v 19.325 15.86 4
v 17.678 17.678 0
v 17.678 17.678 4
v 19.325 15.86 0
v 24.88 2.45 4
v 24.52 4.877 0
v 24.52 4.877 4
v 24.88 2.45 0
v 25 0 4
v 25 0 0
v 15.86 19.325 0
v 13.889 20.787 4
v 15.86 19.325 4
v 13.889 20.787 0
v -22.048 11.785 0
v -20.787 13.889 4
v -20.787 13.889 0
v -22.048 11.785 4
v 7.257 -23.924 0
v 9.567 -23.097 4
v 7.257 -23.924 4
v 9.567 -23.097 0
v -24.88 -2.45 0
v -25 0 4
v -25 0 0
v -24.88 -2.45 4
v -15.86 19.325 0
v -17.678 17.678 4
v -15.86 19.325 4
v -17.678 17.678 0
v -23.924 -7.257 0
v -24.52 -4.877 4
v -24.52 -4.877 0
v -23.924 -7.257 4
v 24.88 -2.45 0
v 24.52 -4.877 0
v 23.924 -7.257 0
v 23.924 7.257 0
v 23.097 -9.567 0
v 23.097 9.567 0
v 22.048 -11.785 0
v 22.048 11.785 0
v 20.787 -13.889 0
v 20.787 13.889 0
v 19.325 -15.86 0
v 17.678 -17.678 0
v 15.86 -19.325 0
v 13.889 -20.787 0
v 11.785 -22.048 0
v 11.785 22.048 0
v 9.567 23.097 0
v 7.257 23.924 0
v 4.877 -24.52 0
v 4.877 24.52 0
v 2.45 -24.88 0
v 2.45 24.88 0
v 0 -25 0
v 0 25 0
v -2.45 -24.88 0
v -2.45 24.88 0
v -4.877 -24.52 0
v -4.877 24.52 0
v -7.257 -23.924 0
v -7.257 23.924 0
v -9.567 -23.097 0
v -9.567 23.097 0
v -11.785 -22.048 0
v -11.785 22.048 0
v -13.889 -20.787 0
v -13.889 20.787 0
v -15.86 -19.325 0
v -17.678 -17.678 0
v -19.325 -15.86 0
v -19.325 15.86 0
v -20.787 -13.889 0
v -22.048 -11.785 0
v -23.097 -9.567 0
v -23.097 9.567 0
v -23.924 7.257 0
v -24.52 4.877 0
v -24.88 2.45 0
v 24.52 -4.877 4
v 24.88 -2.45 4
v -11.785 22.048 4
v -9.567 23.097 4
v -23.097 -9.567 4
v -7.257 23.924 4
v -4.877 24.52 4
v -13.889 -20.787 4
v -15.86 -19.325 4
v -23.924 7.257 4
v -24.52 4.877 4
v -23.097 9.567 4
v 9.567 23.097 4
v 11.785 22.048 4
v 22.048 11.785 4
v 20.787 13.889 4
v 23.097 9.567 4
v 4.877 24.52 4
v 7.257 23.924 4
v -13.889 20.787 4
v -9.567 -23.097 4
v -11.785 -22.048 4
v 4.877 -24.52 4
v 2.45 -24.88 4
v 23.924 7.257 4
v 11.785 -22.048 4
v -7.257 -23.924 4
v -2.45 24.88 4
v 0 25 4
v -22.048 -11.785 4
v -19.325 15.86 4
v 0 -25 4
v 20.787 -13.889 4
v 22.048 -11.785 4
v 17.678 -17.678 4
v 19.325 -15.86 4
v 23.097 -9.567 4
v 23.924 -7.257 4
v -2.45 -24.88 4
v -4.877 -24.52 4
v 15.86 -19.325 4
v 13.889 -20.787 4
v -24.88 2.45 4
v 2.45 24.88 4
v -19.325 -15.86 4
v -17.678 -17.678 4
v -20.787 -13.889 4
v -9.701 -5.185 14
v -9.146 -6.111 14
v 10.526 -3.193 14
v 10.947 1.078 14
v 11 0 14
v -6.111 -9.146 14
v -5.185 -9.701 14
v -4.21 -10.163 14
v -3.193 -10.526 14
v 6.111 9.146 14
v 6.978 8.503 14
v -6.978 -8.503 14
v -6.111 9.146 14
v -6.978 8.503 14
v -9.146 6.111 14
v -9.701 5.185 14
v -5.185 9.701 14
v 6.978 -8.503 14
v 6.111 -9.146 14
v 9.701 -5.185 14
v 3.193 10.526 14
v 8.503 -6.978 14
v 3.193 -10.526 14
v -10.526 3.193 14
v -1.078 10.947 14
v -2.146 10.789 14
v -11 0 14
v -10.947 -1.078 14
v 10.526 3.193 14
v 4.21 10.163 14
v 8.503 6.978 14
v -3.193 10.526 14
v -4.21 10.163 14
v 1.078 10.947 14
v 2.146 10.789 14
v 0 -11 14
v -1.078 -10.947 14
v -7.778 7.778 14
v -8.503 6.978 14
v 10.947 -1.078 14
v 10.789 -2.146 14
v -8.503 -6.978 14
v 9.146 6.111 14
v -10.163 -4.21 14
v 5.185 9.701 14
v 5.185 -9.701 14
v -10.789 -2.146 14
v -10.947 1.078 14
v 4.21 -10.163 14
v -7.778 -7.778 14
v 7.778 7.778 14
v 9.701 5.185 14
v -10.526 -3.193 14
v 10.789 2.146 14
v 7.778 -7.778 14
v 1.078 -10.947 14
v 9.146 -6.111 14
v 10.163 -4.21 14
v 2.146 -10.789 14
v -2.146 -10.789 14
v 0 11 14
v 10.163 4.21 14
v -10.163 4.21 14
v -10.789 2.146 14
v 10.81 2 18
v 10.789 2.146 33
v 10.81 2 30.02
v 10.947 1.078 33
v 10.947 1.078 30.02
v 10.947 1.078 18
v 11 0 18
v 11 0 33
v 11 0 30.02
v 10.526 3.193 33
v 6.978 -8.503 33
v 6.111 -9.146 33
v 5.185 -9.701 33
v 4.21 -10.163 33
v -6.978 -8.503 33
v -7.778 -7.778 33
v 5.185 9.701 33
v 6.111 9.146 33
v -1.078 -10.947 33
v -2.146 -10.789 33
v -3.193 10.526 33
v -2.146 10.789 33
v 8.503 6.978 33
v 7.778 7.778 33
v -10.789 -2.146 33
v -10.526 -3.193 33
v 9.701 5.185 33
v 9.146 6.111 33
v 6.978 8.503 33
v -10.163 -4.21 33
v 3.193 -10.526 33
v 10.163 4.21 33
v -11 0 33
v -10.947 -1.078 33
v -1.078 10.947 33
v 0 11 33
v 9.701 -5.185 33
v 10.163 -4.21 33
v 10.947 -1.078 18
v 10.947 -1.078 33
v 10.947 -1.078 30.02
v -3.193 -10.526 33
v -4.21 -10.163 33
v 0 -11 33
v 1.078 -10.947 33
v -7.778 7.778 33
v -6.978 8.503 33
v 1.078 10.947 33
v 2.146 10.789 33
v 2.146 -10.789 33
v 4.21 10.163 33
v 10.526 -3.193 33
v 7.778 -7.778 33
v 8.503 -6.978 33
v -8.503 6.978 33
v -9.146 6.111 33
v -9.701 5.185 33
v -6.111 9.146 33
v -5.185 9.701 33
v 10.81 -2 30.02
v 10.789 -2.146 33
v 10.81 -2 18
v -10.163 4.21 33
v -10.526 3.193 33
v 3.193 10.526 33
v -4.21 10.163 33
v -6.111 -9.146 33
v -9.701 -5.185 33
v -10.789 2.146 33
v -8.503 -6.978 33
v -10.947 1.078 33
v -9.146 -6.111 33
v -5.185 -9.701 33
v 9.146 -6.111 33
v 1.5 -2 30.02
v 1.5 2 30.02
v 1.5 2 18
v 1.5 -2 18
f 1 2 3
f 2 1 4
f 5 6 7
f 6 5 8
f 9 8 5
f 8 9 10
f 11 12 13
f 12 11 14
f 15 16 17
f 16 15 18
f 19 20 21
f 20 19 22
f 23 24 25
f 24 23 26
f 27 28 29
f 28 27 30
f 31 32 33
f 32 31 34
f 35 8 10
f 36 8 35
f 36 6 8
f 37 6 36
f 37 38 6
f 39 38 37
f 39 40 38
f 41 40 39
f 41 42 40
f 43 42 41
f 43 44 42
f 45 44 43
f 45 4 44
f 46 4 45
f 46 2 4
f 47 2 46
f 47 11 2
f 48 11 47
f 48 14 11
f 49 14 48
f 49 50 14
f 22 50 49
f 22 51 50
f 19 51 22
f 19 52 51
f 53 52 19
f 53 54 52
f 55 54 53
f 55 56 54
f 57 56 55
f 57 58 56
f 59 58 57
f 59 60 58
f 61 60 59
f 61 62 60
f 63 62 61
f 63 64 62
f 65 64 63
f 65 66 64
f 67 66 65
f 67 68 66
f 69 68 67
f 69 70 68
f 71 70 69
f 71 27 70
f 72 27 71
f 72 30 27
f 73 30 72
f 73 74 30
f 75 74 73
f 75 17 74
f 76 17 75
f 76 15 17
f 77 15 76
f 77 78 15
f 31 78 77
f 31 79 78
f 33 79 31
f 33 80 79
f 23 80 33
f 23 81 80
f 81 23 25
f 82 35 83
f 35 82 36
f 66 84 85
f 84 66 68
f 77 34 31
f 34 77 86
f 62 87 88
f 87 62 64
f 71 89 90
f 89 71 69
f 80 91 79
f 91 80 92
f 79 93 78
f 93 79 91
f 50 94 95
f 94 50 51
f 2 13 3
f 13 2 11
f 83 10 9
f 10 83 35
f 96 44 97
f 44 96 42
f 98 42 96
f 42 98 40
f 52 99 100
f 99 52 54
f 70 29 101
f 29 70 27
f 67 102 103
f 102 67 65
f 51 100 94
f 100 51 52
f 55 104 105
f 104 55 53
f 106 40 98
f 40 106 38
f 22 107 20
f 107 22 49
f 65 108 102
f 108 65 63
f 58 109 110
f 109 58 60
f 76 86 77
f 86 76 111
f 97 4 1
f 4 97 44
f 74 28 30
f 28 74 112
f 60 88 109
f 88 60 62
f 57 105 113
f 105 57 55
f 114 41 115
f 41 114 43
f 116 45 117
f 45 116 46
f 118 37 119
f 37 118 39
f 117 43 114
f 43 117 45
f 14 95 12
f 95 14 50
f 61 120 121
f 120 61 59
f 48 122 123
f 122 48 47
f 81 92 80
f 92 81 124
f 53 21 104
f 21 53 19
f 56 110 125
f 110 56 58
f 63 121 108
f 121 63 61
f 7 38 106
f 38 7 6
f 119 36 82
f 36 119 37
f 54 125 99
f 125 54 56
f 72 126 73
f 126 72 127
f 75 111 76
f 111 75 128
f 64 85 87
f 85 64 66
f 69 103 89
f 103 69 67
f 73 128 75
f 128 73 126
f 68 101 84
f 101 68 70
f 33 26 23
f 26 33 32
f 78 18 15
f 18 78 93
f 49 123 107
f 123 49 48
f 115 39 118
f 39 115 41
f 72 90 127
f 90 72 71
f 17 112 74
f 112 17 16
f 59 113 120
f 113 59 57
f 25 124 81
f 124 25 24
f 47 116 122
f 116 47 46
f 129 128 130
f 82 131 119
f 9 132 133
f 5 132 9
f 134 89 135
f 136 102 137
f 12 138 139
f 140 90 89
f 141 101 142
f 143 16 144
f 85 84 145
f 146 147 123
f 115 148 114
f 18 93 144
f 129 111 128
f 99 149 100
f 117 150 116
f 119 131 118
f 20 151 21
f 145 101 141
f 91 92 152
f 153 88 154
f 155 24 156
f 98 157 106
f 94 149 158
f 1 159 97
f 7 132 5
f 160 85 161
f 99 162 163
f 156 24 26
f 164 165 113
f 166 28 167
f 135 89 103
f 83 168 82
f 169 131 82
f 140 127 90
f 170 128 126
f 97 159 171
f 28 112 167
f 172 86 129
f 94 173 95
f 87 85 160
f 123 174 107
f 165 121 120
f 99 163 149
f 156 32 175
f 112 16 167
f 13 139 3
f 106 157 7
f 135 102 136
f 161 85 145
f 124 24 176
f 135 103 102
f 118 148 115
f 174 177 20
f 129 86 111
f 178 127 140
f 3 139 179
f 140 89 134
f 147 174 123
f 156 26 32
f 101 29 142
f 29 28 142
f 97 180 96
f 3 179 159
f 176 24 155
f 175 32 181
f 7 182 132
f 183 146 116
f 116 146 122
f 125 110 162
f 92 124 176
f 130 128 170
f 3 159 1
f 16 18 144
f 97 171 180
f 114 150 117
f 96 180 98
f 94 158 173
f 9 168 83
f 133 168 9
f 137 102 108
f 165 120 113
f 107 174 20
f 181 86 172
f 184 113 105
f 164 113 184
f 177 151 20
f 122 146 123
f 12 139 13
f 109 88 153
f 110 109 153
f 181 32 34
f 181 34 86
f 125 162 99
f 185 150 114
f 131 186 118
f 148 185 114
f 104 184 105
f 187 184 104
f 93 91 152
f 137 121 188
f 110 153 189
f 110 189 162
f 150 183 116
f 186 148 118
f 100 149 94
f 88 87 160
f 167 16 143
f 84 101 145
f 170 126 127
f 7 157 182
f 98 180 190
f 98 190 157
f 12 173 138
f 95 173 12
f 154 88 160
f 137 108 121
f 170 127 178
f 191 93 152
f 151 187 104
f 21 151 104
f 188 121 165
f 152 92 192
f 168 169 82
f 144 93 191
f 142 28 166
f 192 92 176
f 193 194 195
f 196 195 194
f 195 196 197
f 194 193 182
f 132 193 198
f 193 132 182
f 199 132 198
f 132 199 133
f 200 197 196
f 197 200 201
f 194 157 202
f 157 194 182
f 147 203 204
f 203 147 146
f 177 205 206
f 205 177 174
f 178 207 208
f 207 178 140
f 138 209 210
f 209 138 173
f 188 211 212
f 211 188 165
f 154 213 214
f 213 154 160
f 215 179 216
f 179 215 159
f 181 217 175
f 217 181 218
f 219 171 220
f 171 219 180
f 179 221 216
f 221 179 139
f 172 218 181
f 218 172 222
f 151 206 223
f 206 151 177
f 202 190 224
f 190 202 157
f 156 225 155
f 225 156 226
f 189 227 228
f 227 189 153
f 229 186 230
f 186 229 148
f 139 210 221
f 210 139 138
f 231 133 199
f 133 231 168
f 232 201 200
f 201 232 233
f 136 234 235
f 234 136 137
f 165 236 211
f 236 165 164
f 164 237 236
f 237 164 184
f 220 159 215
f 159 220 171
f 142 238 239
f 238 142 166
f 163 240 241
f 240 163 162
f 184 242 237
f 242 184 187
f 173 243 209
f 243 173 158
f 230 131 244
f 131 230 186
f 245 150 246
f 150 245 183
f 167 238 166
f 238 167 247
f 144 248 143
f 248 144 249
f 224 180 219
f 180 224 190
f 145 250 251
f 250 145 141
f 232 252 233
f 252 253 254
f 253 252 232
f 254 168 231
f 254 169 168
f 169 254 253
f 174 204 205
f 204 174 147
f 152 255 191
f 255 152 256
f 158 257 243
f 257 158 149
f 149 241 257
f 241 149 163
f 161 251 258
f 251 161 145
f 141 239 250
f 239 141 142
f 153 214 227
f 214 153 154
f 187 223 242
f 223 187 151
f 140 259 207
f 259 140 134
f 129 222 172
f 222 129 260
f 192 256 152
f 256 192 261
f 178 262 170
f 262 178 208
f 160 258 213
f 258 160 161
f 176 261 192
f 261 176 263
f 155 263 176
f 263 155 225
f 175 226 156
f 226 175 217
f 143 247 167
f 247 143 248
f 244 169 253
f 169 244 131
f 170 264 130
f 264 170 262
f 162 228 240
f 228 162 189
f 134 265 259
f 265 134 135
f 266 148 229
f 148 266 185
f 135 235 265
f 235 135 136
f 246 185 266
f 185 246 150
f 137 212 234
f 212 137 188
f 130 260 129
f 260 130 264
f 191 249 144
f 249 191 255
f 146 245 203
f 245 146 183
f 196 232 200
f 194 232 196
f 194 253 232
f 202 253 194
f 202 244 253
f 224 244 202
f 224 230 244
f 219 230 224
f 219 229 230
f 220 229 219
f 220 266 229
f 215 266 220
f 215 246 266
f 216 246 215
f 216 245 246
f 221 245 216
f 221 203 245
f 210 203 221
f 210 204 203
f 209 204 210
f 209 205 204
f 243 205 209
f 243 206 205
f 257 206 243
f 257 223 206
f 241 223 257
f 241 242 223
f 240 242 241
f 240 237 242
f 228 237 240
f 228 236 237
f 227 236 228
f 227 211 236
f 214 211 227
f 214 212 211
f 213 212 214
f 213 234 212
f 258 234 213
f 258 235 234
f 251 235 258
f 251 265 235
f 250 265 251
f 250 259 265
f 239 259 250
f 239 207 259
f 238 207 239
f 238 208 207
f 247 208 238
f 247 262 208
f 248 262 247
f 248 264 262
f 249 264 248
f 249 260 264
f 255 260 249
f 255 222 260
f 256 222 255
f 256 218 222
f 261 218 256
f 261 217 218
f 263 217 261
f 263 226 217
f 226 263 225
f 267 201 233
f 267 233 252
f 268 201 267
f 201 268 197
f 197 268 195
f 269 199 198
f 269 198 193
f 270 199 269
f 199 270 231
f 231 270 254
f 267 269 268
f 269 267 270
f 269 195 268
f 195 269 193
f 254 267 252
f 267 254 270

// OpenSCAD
// Dimensions (mm) - measured with calipers
base_dia = 50;
base_h = 4;
cone_top_dia = 50;
cone_bot_dia = 22;
cone_h = 10; // z=4 to z=14
col_dia = 22;
col_h = 19; // z=14 to z=33
seat_dia = 11;
seat_h = 10; // z=33 down to z=23
tip_dia = 3;
tip_z = 6;
window_w = 4;
window_z1 = 18;
window_z2 = 30;

$fn = 64;

// The previous attempt failed to cut the window because the difference()
// was applied to the union of solids, but the window cutout was defined
// incorrectly or the logic was flawed in the previous iteration.
// Specifically, the window must cut through the column wall.
// The column is solid from r=0 to r=11.
// The seat is a hole from r=0 to r=5.5 (for z>23) and a cone for z<23.
// The window is on the +X side.
// It goes from the inner surface of the seat to the outer surface of the column.
// Inner radius at window height (z=18 to 30):
// For z=18 to 23: The seat is conical. We need the radius of the seat at that Z.
// For z=23 to 30: The seat is cylindrical, radius = 5.5.
// The window is 4mm wide in Y.
// The window cuts from X = seat_radius to X = col_radius + margin.

difference() {
    union() {
        // Base disc
        translate([0, 0, 0])
          cylinder(h = base_h, r = base_dia / 2, center = false);

        // Cone from z=4 to z=14
        translate([0, 0, base_h])
          cylinder(h = cone_h, r1 = cone_top_dia / 2, r2 = cone_bot_dia / 2, center = false);

        // Column from z=14 to z=33
        translate([0, 0, base_h + cone_h])
          cylinder(h = col_h, r = col_dia / 2, center = false);

        // Tube seat (cylindrical part) from z=23 to z=33
        translate([0, 0, tip_z + seat_h])
          cylinder(h = seat_h, r = seat_dia / 2, center = false);

        // Tube seat (conical part) from z=6 to z=23
        cone_seat_h = 23 - tip_z;
        translate([0, 0, tip_z])
          cylinder(h = cone_seat_h, r1 = tip_dia / 2, r2 = seat_dia / 2, center = false);
    }

    // Cut out the viewing window
    // The window is a rectangular slot on the +X side.
    // Y range: -window_w/2 to +window_w/2
    // Z range: window_z1 to window_z2
    // X range: from the inner seat surface to the outer column surface + margin
    
    // To ensure we cut cleanly through the varying inner radius (cone vs cylinder),
    // we can define the cut as a box that starts at the minimum inner radius (tip_dia/2 = 1.5)
    // and extends to the outer radius + margin.
    // However, the spec says "from the seat to the outside".
    // The seat inner radius varies.
    // At z=18, the seat is conical.
    // Radius at z=18:
    // Cone goes from r=1.5 at z=6 to r=5.5 at z=23.
    // Height of cone = 17.
    // z=18 is 12mm above z=6.
    // r(z) = 1.5 + (5.5-1.5)*(z-6)/17
    // r(18) = 1.5 + 4*(12/17) = 1.5 + 2.82 = 4.32 mm.
    // At z=23, r=5.5.
    // At z=30, r=5.5.
    
    // If we cut from X=1.5 (tip radius) to X=12 (outer+margin), we will cut into the solid
    // below the seat surface for z<23, which is wrong (the stand is solid below z=6, but the seat is hollow above z=6).
    // Wait, the spec says "below z=6 the stand is solid".
    // The seat is hollow from z=6 to z=33.
    // So the window should cut through the wall thickness.
    // The wall thickness is (col_radius - seat_radius).
    // We need to cut from X = seat_radius to X = col_radius + margin.
    
    // Since the seat radius varies with Z, a simple box won't perfectly match the inner surface.
    // However, for a 3D print, a simple box cut is often sufficient if it doesn't leave too much material.
    // But to be precise, we can use a linear_extrude or a custom shape.
    // Given the constraints, let's use a box that covers the maximum inner radius (5.5) to ensure we don't cut into the seat volume.
    // If we start the cut at X=5.5, we might leave a small amount of material at z=18 where the seat is narrower (4.32).
    // To be safe and clean, let's start the cut at X=1.5 (the narrowest point) and extend to X=12.
    // This will cut through the solid part of the stand below the seat? No, the seat is hollow.
    // The difference() removes material. If we remove material from X=1.5 to 12, we are removing the wall.
    // Is there solid material at X=1.5? No, the seat is hollow there.
    // So cutting from 1.5 to 12 is safe and ensures the window goes all the way to the inner surface.
    
    translate([1.5, -window_w / 2, window_z1])
      cube([col_dia / 2 + 1 - 1.5, window_w, window_z2 - window_z1 + 0.02]);
}
